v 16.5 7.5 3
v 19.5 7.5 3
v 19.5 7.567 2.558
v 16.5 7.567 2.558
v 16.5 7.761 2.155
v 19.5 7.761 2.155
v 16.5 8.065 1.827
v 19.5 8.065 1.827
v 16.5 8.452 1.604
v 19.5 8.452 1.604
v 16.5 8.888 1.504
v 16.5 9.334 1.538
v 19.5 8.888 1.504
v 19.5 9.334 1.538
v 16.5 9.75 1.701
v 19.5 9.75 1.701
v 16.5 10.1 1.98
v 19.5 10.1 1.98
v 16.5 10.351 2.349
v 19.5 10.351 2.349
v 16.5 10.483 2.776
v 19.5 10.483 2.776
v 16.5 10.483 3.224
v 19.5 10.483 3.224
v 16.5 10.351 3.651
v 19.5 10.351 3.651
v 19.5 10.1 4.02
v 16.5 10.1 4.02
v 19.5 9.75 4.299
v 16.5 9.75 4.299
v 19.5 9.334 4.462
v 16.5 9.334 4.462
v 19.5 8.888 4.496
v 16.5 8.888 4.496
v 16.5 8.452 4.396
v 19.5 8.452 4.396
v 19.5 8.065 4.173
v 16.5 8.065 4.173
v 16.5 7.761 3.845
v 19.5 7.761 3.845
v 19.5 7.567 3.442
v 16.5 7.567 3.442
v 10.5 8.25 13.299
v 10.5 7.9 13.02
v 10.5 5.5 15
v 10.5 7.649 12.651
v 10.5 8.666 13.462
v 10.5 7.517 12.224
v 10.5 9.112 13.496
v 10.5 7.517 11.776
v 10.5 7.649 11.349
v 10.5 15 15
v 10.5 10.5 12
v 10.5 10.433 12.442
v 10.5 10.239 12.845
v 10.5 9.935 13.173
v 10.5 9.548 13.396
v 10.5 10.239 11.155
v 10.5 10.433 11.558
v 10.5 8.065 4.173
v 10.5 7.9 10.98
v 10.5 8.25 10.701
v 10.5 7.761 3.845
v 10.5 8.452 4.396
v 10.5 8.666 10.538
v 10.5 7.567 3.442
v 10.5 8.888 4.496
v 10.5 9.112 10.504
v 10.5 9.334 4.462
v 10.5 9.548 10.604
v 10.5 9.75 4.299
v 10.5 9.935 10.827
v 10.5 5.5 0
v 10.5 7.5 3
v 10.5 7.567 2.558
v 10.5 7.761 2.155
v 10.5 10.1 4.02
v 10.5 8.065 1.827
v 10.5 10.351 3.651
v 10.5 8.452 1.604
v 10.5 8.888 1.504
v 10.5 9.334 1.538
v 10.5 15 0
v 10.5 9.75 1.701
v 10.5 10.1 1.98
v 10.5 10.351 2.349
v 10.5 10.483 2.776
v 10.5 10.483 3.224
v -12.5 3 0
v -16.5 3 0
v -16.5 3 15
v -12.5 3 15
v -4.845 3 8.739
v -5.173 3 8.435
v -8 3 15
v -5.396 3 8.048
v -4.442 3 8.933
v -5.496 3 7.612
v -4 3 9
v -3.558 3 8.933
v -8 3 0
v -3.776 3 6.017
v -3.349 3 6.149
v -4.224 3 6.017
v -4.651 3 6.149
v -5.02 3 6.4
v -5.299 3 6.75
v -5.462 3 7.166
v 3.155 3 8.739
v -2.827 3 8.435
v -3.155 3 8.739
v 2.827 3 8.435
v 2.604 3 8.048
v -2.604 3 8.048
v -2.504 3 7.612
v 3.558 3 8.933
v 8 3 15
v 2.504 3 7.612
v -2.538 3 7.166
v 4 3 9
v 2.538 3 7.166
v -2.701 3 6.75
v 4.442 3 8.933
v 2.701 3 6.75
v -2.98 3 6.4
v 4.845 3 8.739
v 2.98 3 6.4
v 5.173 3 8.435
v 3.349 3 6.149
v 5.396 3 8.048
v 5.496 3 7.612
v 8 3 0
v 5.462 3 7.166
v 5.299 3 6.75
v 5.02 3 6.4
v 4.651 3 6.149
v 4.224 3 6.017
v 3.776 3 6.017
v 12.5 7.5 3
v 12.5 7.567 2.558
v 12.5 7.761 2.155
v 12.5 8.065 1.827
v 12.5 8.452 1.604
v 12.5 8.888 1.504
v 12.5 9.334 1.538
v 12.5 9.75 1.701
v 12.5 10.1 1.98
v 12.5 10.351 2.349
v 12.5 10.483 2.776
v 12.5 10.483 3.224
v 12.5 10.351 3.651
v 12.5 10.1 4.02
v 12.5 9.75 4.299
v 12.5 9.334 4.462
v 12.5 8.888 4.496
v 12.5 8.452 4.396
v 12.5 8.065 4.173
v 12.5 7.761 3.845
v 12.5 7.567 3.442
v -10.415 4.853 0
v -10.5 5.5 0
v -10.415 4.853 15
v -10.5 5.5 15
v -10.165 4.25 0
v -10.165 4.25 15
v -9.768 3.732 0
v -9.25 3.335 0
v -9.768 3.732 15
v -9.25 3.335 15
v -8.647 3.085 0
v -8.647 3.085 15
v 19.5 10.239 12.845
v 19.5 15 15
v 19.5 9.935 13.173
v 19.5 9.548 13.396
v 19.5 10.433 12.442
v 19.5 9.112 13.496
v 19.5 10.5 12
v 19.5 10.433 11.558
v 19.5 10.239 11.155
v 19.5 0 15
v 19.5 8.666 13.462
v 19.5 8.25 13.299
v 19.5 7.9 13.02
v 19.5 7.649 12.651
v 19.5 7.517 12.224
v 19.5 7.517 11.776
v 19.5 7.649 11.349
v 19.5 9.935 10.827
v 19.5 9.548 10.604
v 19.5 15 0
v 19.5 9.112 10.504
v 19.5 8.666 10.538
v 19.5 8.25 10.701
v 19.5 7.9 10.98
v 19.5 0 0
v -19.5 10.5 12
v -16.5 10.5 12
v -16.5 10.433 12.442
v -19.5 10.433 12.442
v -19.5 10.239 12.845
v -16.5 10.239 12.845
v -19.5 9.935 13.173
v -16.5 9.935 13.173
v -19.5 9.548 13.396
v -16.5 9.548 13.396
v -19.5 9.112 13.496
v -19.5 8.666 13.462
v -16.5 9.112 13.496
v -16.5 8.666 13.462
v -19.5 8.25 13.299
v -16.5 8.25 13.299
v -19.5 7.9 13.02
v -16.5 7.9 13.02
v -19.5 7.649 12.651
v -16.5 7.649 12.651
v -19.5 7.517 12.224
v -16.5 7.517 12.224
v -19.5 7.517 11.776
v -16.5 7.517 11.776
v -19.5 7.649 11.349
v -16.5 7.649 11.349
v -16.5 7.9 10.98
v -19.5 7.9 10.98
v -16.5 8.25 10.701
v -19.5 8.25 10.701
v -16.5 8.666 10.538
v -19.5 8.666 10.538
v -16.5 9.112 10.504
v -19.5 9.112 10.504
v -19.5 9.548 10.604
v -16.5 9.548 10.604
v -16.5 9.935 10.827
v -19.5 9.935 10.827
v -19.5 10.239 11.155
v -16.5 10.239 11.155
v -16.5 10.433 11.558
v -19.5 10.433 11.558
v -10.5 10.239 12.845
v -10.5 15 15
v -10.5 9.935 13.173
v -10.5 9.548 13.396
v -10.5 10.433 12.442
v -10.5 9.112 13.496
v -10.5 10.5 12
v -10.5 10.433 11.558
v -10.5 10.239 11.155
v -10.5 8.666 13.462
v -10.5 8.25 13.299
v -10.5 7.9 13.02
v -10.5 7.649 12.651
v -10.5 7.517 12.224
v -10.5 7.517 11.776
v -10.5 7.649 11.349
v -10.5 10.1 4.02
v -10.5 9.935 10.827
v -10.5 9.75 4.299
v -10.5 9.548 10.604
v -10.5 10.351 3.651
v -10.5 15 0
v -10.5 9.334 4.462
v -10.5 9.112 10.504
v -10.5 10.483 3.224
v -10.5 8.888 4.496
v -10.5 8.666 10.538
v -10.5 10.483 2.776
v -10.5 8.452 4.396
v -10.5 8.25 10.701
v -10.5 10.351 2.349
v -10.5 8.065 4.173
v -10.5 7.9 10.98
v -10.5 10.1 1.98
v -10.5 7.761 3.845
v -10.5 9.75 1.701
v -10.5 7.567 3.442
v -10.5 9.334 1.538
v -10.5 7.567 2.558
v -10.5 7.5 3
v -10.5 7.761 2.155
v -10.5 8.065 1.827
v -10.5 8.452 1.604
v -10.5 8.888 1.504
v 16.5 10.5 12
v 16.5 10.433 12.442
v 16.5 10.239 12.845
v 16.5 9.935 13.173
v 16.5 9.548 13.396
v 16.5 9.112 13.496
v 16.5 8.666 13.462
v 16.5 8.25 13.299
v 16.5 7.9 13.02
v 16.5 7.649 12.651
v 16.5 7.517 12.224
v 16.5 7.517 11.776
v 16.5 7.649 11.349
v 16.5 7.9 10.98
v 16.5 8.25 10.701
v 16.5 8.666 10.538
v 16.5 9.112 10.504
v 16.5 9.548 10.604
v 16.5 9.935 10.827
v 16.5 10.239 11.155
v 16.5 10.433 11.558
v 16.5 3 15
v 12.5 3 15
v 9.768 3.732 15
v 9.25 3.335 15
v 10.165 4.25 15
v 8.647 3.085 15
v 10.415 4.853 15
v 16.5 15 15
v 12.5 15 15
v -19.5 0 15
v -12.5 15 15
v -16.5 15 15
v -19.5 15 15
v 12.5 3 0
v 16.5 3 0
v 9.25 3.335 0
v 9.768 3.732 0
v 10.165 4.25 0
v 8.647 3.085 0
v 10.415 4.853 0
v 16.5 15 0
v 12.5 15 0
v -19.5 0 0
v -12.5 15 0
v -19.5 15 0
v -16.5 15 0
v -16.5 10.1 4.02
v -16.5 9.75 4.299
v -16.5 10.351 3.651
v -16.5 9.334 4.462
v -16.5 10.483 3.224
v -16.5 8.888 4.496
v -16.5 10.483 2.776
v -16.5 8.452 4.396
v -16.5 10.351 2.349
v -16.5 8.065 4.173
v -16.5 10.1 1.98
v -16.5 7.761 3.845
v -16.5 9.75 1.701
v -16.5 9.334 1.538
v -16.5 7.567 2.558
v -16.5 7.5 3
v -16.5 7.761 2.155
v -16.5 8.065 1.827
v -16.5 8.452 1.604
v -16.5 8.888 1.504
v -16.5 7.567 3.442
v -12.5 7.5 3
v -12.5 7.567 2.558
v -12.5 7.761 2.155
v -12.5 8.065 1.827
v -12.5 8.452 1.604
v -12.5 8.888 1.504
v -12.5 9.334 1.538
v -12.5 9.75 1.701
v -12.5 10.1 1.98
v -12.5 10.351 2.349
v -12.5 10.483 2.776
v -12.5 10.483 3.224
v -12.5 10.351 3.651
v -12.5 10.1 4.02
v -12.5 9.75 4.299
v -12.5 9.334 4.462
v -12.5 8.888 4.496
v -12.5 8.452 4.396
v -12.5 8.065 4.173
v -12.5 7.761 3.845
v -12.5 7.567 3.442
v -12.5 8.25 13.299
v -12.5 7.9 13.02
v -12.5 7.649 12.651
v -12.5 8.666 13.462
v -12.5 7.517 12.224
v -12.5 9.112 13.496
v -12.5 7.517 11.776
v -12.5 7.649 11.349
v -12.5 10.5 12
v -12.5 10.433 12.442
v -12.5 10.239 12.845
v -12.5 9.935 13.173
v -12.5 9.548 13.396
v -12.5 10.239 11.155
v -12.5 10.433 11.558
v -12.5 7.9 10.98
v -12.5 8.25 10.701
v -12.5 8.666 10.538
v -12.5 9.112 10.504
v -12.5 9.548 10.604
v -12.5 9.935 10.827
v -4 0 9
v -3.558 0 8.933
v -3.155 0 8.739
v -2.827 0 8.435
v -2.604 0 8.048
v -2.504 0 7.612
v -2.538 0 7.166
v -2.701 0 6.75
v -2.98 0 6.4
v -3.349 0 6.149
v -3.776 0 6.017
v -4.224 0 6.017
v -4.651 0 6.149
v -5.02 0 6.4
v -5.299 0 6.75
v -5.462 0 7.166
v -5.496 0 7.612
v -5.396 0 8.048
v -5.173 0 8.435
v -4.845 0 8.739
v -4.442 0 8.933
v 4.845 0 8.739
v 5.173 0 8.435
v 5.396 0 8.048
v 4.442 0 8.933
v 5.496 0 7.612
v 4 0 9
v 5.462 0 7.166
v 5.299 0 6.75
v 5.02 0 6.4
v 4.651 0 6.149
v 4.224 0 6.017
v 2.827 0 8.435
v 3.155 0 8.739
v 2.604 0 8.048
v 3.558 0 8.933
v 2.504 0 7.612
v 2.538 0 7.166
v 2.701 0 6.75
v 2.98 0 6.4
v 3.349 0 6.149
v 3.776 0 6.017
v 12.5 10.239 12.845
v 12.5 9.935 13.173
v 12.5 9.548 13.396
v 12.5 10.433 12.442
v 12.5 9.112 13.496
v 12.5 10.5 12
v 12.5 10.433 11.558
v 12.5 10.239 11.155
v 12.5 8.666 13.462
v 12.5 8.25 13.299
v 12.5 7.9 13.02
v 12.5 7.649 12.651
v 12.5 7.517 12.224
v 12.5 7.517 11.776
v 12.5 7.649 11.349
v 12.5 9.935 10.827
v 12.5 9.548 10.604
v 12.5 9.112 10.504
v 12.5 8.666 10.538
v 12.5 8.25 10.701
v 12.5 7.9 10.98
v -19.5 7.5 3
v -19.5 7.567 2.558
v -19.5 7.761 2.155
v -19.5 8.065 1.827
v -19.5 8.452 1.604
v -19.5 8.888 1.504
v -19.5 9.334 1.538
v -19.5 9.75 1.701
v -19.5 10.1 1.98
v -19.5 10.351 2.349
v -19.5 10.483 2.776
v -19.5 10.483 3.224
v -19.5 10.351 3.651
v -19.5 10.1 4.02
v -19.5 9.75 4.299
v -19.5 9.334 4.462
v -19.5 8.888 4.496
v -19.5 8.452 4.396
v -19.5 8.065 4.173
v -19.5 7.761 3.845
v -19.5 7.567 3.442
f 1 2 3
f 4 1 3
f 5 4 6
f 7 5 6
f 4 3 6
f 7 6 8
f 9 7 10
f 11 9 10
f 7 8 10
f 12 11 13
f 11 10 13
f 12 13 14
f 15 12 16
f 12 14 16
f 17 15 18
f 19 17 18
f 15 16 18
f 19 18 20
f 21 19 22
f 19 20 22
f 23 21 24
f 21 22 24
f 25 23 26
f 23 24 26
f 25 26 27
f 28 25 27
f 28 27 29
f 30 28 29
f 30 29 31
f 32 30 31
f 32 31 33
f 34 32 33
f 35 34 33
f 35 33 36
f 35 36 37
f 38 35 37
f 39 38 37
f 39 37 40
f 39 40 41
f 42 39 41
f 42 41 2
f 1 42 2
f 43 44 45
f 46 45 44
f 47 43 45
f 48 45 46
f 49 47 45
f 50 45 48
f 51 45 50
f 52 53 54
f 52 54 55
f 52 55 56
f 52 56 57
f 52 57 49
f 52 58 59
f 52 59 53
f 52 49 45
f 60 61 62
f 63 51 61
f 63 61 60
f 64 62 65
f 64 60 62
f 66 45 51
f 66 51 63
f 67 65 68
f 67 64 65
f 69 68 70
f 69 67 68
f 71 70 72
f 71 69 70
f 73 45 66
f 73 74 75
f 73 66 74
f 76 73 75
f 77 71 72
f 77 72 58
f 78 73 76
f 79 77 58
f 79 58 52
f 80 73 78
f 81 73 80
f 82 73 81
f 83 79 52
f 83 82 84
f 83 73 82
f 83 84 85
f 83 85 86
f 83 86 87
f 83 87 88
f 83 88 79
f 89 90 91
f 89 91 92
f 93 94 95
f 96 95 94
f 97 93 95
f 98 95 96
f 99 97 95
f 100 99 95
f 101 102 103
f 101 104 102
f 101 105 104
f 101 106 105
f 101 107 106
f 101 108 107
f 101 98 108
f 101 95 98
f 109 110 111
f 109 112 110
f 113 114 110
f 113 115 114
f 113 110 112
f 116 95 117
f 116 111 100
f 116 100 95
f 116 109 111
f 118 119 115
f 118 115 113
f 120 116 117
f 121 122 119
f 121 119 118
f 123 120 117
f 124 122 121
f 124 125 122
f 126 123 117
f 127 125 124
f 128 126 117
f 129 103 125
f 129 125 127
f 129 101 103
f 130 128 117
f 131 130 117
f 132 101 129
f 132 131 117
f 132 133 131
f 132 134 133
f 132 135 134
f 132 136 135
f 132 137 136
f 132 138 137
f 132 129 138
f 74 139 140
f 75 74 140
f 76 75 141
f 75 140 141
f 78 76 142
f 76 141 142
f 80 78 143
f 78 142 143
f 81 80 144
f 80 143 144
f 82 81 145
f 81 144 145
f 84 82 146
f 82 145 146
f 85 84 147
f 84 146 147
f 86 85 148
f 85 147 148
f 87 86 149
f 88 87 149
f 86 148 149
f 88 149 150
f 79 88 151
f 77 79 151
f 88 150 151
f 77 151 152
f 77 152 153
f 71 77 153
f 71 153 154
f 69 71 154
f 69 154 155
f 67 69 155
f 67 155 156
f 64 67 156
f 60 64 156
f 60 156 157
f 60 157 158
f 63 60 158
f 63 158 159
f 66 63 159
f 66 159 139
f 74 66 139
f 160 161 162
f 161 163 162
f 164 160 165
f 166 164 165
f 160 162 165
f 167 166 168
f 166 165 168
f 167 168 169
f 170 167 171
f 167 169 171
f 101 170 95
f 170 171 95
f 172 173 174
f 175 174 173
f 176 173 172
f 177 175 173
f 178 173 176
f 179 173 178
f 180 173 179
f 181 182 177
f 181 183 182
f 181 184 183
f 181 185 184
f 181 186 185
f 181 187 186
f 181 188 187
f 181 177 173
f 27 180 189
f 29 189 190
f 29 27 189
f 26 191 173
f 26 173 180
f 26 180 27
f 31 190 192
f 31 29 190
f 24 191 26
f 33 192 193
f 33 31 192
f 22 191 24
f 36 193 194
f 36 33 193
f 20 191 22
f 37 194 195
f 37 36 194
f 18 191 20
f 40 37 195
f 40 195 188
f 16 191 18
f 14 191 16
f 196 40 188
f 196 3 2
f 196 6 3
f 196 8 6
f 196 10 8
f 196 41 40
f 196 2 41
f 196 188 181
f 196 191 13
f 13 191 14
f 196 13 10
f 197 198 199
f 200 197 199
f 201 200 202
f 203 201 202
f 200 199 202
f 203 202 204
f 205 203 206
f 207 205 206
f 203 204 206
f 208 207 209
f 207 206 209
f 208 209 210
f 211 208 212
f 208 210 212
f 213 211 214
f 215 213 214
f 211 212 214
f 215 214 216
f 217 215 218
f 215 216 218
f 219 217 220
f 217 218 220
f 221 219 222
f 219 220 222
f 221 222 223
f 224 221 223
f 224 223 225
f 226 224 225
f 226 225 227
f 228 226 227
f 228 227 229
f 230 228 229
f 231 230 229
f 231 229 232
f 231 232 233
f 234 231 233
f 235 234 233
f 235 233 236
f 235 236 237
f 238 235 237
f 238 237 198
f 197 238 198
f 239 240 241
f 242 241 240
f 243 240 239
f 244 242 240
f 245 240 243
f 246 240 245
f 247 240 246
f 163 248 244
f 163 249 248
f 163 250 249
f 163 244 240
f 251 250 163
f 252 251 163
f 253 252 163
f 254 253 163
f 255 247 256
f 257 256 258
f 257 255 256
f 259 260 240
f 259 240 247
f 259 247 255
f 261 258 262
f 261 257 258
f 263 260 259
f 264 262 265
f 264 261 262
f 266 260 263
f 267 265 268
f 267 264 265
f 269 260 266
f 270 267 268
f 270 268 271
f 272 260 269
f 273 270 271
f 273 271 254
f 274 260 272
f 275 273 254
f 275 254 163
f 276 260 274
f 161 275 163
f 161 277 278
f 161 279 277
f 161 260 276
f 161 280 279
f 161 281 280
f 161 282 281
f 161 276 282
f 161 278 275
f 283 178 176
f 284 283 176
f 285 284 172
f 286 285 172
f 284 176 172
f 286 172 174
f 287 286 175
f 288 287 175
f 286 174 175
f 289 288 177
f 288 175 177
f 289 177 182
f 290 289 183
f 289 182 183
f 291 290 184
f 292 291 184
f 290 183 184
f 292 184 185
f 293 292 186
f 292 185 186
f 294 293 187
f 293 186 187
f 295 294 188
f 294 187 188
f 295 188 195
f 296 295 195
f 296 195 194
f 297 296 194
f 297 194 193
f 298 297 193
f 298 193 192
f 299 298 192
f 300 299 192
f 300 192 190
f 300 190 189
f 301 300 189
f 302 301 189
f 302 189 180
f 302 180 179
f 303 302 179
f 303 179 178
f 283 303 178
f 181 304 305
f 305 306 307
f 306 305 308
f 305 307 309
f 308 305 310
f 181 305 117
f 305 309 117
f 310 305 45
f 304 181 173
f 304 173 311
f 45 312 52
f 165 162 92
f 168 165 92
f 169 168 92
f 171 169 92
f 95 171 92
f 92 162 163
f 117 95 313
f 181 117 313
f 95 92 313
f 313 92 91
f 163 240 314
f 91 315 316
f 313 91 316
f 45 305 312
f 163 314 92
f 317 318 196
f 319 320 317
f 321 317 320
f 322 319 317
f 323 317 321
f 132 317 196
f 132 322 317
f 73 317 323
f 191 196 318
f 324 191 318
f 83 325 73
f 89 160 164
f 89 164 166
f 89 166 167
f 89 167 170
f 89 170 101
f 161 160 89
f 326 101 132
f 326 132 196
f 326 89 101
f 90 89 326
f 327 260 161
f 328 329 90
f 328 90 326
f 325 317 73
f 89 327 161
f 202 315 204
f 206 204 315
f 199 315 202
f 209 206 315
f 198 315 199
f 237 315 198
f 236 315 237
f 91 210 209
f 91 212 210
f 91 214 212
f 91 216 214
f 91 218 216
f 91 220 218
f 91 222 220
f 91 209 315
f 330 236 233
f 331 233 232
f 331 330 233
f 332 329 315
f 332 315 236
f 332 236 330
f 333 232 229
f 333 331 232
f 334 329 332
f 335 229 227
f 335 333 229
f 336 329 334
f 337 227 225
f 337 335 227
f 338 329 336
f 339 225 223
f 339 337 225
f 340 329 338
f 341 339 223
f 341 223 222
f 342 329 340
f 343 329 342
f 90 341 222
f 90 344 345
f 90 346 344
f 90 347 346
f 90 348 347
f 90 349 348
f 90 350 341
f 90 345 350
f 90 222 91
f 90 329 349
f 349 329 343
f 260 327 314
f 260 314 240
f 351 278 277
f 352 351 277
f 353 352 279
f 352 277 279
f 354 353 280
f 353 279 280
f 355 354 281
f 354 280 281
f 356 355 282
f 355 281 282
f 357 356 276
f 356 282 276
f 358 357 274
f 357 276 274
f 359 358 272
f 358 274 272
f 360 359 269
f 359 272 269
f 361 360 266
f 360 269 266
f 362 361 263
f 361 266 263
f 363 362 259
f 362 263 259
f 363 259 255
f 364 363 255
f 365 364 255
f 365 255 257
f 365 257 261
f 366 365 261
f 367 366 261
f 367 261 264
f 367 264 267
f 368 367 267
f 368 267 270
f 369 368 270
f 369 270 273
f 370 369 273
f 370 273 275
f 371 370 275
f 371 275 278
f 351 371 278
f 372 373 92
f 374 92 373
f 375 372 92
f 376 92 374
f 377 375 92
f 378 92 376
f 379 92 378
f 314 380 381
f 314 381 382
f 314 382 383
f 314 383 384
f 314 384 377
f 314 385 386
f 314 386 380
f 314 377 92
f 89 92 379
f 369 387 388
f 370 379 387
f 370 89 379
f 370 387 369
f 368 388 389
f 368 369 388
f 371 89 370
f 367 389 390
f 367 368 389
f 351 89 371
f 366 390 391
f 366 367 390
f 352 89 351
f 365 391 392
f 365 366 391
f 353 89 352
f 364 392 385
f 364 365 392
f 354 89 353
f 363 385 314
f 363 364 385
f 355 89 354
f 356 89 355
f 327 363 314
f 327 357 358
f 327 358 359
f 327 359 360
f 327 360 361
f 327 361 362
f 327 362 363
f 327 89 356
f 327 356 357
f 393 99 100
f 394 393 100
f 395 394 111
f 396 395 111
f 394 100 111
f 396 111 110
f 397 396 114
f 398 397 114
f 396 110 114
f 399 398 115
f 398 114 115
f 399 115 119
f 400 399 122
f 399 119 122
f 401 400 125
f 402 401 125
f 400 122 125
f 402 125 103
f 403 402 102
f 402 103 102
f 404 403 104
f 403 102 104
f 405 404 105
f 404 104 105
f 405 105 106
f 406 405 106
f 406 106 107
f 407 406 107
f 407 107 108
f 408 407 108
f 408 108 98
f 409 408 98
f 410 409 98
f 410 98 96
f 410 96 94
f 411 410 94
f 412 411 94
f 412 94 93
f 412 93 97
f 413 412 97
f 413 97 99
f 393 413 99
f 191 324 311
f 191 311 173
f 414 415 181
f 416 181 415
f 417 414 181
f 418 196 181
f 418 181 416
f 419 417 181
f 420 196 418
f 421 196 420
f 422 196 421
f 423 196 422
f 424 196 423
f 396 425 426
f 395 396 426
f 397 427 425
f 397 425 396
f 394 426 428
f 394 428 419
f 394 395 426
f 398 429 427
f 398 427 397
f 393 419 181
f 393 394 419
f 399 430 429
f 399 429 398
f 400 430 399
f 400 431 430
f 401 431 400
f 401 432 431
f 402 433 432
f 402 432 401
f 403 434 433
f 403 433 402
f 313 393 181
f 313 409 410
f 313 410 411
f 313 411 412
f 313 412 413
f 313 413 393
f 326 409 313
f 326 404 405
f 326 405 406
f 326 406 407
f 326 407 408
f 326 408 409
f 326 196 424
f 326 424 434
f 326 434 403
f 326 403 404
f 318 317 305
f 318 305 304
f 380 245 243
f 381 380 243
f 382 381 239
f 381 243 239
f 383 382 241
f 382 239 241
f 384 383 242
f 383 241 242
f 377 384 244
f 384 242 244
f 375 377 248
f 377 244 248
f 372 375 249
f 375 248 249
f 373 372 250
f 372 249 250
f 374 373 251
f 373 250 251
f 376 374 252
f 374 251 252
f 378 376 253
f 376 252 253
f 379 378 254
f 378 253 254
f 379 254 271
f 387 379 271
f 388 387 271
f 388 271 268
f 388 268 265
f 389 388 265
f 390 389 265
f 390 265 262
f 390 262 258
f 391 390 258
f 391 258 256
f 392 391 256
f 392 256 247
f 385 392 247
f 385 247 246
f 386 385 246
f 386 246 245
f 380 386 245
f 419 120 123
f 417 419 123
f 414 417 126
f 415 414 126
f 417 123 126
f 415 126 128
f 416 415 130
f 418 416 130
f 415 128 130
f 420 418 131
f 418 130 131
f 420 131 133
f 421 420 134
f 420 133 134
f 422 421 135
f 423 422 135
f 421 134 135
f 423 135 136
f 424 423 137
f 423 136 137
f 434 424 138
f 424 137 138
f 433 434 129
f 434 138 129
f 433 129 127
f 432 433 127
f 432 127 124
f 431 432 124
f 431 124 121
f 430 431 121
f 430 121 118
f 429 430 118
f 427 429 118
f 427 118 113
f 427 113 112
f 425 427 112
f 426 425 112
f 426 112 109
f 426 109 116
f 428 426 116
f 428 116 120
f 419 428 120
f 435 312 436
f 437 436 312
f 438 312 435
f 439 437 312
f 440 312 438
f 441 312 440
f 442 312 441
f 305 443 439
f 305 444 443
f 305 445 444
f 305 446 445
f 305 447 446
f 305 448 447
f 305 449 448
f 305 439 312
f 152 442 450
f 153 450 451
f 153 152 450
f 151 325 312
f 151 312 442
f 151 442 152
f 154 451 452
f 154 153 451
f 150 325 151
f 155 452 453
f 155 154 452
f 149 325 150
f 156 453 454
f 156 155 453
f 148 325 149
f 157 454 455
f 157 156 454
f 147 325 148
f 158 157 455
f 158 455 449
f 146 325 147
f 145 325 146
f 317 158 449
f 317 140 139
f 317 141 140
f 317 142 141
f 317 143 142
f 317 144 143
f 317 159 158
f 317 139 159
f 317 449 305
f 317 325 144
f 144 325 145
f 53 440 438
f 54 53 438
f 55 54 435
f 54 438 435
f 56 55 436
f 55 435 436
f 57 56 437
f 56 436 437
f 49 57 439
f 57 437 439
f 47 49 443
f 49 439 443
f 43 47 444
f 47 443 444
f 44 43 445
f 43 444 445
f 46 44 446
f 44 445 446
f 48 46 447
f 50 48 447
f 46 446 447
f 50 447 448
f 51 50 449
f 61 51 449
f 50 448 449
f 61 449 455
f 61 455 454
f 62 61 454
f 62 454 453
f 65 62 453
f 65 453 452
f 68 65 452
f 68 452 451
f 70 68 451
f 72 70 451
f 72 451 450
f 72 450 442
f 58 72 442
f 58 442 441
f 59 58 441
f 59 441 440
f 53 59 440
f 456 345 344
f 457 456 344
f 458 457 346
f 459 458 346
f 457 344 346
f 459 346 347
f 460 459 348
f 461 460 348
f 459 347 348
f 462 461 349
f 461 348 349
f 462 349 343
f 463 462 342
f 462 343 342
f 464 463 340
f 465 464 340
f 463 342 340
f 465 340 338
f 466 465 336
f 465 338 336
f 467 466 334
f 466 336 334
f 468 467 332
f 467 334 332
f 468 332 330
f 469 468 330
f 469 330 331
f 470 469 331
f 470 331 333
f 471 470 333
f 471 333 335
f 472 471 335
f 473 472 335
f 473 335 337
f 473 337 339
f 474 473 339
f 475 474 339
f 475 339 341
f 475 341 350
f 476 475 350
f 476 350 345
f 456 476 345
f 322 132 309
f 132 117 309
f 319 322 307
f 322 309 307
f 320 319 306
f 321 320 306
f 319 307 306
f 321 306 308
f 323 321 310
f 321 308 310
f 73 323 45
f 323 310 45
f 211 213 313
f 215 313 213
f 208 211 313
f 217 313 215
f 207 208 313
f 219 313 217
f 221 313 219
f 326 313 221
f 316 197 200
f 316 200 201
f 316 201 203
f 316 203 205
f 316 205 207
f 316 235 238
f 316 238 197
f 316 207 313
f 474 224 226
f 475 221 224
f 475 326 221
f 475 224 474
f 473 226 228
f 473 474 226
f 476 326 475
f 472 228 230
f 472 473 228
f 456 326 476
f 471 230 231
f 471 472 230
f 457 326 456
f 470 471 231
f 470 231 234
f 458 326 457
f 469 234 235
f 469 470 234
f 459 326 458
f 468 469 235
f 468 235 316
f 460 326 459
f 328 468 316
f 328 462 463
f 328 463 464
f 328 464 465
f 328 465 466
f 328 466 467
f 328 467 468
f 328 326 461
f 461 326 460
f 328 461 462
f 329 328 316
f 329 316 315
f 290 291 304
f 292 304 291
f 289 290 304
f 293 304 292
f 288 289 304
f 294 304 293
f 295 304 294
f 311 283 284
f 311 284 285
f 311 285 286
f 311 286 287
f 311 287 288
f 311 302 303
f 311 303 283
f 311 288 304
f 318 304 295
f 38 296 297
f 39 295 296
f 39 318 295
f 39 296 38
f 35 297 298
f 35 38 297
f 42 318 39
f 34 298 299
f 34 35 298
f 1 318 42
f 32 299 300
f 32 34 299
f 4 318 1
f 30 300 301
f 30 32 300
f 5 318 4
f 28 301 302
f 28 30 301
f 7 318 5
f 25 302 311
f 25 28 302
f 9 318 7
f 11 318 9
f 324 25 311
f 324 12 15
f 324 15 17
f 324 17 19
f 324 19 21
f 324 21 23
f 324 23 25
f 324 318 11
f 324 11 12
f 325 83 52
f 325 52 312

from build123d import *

# Parameters (mm, degrees)
EXTRUDE_1_DEPTH     = 15
SKETCH_2_R          = 1.5
CUT_EXTRUDE_1_DEPTH = 15
SKETCH_3_R          = 1.5
CUT_EXTRUDE_2_DEPTH = 45.395945761
FILLET_1_R          = 2.5


with BuildPart() as part:
    # 草图1 → 凸台-拉伸1 (new body)
    with BuildSketch(Plane.XY):
        Polygon((19.5, 0), (-19.5, 0), (-19.5, 15), (-16.5, 15), (-16.5, 3), (-12.5, 3), (-12.5, 15), (-10.5, 15), (-10.5, 3), (10.5, 3), (10.5, 15), (12.5, 15), (12.5, 3), (16.5, 3), (16.5, 15), (19.5, 15), align=None)
    extrude(amount=EXTRUDE_1_DEPTH)

    # 草图2 → 切除-拉伸1 (cut)
    with BuildSketch(Plane(origin=(0, 3, 0), x_dir=(1, 0, 0), z_dir=(0, 1, 0))):
        with Locations(Location((-4, -7.5, 0), (0, 0, 270))):
            Circle(SKETCH_2_R)
        with Locations(Location((4, -7.5, 0), (0, 0, 270))):
            Circle(SKETCH_2_R)
    extrude(amount=-CUT_EXTRUDE_1_DEPTH, mode=Mode.SUBTRACT)

    # 草图3 → 切除-拉伸2 (cut, through all)
    with BuildSketch(Plane(origin=(19.5, 0, 0), x_dir=(0, 0, -1), z_dir=(1, 0, 0))):
        with Locations(Location((-12, 9, 0), (0, 0, 90))):
            Circle(SKETCH_3_R)
        with Locations(Location((-3, 9, 0), (0, 0, 270))):
            Circle(SKETCH_3_R)
    extrude(amount=-CUT_EXTRUDE_2_DEPTH, mode=Mode.SUBTRACT)

    # 圆角1
    fillet_1_edges = [part.edges().sort_by_distance(p)[0] for p in [
        (-10.5, 3, 7.5),
        (10.5, 3, 7.5),
    ]]
    fillet(fillet_1_edges, radius=FILLET_1_R)


solid = part.part
